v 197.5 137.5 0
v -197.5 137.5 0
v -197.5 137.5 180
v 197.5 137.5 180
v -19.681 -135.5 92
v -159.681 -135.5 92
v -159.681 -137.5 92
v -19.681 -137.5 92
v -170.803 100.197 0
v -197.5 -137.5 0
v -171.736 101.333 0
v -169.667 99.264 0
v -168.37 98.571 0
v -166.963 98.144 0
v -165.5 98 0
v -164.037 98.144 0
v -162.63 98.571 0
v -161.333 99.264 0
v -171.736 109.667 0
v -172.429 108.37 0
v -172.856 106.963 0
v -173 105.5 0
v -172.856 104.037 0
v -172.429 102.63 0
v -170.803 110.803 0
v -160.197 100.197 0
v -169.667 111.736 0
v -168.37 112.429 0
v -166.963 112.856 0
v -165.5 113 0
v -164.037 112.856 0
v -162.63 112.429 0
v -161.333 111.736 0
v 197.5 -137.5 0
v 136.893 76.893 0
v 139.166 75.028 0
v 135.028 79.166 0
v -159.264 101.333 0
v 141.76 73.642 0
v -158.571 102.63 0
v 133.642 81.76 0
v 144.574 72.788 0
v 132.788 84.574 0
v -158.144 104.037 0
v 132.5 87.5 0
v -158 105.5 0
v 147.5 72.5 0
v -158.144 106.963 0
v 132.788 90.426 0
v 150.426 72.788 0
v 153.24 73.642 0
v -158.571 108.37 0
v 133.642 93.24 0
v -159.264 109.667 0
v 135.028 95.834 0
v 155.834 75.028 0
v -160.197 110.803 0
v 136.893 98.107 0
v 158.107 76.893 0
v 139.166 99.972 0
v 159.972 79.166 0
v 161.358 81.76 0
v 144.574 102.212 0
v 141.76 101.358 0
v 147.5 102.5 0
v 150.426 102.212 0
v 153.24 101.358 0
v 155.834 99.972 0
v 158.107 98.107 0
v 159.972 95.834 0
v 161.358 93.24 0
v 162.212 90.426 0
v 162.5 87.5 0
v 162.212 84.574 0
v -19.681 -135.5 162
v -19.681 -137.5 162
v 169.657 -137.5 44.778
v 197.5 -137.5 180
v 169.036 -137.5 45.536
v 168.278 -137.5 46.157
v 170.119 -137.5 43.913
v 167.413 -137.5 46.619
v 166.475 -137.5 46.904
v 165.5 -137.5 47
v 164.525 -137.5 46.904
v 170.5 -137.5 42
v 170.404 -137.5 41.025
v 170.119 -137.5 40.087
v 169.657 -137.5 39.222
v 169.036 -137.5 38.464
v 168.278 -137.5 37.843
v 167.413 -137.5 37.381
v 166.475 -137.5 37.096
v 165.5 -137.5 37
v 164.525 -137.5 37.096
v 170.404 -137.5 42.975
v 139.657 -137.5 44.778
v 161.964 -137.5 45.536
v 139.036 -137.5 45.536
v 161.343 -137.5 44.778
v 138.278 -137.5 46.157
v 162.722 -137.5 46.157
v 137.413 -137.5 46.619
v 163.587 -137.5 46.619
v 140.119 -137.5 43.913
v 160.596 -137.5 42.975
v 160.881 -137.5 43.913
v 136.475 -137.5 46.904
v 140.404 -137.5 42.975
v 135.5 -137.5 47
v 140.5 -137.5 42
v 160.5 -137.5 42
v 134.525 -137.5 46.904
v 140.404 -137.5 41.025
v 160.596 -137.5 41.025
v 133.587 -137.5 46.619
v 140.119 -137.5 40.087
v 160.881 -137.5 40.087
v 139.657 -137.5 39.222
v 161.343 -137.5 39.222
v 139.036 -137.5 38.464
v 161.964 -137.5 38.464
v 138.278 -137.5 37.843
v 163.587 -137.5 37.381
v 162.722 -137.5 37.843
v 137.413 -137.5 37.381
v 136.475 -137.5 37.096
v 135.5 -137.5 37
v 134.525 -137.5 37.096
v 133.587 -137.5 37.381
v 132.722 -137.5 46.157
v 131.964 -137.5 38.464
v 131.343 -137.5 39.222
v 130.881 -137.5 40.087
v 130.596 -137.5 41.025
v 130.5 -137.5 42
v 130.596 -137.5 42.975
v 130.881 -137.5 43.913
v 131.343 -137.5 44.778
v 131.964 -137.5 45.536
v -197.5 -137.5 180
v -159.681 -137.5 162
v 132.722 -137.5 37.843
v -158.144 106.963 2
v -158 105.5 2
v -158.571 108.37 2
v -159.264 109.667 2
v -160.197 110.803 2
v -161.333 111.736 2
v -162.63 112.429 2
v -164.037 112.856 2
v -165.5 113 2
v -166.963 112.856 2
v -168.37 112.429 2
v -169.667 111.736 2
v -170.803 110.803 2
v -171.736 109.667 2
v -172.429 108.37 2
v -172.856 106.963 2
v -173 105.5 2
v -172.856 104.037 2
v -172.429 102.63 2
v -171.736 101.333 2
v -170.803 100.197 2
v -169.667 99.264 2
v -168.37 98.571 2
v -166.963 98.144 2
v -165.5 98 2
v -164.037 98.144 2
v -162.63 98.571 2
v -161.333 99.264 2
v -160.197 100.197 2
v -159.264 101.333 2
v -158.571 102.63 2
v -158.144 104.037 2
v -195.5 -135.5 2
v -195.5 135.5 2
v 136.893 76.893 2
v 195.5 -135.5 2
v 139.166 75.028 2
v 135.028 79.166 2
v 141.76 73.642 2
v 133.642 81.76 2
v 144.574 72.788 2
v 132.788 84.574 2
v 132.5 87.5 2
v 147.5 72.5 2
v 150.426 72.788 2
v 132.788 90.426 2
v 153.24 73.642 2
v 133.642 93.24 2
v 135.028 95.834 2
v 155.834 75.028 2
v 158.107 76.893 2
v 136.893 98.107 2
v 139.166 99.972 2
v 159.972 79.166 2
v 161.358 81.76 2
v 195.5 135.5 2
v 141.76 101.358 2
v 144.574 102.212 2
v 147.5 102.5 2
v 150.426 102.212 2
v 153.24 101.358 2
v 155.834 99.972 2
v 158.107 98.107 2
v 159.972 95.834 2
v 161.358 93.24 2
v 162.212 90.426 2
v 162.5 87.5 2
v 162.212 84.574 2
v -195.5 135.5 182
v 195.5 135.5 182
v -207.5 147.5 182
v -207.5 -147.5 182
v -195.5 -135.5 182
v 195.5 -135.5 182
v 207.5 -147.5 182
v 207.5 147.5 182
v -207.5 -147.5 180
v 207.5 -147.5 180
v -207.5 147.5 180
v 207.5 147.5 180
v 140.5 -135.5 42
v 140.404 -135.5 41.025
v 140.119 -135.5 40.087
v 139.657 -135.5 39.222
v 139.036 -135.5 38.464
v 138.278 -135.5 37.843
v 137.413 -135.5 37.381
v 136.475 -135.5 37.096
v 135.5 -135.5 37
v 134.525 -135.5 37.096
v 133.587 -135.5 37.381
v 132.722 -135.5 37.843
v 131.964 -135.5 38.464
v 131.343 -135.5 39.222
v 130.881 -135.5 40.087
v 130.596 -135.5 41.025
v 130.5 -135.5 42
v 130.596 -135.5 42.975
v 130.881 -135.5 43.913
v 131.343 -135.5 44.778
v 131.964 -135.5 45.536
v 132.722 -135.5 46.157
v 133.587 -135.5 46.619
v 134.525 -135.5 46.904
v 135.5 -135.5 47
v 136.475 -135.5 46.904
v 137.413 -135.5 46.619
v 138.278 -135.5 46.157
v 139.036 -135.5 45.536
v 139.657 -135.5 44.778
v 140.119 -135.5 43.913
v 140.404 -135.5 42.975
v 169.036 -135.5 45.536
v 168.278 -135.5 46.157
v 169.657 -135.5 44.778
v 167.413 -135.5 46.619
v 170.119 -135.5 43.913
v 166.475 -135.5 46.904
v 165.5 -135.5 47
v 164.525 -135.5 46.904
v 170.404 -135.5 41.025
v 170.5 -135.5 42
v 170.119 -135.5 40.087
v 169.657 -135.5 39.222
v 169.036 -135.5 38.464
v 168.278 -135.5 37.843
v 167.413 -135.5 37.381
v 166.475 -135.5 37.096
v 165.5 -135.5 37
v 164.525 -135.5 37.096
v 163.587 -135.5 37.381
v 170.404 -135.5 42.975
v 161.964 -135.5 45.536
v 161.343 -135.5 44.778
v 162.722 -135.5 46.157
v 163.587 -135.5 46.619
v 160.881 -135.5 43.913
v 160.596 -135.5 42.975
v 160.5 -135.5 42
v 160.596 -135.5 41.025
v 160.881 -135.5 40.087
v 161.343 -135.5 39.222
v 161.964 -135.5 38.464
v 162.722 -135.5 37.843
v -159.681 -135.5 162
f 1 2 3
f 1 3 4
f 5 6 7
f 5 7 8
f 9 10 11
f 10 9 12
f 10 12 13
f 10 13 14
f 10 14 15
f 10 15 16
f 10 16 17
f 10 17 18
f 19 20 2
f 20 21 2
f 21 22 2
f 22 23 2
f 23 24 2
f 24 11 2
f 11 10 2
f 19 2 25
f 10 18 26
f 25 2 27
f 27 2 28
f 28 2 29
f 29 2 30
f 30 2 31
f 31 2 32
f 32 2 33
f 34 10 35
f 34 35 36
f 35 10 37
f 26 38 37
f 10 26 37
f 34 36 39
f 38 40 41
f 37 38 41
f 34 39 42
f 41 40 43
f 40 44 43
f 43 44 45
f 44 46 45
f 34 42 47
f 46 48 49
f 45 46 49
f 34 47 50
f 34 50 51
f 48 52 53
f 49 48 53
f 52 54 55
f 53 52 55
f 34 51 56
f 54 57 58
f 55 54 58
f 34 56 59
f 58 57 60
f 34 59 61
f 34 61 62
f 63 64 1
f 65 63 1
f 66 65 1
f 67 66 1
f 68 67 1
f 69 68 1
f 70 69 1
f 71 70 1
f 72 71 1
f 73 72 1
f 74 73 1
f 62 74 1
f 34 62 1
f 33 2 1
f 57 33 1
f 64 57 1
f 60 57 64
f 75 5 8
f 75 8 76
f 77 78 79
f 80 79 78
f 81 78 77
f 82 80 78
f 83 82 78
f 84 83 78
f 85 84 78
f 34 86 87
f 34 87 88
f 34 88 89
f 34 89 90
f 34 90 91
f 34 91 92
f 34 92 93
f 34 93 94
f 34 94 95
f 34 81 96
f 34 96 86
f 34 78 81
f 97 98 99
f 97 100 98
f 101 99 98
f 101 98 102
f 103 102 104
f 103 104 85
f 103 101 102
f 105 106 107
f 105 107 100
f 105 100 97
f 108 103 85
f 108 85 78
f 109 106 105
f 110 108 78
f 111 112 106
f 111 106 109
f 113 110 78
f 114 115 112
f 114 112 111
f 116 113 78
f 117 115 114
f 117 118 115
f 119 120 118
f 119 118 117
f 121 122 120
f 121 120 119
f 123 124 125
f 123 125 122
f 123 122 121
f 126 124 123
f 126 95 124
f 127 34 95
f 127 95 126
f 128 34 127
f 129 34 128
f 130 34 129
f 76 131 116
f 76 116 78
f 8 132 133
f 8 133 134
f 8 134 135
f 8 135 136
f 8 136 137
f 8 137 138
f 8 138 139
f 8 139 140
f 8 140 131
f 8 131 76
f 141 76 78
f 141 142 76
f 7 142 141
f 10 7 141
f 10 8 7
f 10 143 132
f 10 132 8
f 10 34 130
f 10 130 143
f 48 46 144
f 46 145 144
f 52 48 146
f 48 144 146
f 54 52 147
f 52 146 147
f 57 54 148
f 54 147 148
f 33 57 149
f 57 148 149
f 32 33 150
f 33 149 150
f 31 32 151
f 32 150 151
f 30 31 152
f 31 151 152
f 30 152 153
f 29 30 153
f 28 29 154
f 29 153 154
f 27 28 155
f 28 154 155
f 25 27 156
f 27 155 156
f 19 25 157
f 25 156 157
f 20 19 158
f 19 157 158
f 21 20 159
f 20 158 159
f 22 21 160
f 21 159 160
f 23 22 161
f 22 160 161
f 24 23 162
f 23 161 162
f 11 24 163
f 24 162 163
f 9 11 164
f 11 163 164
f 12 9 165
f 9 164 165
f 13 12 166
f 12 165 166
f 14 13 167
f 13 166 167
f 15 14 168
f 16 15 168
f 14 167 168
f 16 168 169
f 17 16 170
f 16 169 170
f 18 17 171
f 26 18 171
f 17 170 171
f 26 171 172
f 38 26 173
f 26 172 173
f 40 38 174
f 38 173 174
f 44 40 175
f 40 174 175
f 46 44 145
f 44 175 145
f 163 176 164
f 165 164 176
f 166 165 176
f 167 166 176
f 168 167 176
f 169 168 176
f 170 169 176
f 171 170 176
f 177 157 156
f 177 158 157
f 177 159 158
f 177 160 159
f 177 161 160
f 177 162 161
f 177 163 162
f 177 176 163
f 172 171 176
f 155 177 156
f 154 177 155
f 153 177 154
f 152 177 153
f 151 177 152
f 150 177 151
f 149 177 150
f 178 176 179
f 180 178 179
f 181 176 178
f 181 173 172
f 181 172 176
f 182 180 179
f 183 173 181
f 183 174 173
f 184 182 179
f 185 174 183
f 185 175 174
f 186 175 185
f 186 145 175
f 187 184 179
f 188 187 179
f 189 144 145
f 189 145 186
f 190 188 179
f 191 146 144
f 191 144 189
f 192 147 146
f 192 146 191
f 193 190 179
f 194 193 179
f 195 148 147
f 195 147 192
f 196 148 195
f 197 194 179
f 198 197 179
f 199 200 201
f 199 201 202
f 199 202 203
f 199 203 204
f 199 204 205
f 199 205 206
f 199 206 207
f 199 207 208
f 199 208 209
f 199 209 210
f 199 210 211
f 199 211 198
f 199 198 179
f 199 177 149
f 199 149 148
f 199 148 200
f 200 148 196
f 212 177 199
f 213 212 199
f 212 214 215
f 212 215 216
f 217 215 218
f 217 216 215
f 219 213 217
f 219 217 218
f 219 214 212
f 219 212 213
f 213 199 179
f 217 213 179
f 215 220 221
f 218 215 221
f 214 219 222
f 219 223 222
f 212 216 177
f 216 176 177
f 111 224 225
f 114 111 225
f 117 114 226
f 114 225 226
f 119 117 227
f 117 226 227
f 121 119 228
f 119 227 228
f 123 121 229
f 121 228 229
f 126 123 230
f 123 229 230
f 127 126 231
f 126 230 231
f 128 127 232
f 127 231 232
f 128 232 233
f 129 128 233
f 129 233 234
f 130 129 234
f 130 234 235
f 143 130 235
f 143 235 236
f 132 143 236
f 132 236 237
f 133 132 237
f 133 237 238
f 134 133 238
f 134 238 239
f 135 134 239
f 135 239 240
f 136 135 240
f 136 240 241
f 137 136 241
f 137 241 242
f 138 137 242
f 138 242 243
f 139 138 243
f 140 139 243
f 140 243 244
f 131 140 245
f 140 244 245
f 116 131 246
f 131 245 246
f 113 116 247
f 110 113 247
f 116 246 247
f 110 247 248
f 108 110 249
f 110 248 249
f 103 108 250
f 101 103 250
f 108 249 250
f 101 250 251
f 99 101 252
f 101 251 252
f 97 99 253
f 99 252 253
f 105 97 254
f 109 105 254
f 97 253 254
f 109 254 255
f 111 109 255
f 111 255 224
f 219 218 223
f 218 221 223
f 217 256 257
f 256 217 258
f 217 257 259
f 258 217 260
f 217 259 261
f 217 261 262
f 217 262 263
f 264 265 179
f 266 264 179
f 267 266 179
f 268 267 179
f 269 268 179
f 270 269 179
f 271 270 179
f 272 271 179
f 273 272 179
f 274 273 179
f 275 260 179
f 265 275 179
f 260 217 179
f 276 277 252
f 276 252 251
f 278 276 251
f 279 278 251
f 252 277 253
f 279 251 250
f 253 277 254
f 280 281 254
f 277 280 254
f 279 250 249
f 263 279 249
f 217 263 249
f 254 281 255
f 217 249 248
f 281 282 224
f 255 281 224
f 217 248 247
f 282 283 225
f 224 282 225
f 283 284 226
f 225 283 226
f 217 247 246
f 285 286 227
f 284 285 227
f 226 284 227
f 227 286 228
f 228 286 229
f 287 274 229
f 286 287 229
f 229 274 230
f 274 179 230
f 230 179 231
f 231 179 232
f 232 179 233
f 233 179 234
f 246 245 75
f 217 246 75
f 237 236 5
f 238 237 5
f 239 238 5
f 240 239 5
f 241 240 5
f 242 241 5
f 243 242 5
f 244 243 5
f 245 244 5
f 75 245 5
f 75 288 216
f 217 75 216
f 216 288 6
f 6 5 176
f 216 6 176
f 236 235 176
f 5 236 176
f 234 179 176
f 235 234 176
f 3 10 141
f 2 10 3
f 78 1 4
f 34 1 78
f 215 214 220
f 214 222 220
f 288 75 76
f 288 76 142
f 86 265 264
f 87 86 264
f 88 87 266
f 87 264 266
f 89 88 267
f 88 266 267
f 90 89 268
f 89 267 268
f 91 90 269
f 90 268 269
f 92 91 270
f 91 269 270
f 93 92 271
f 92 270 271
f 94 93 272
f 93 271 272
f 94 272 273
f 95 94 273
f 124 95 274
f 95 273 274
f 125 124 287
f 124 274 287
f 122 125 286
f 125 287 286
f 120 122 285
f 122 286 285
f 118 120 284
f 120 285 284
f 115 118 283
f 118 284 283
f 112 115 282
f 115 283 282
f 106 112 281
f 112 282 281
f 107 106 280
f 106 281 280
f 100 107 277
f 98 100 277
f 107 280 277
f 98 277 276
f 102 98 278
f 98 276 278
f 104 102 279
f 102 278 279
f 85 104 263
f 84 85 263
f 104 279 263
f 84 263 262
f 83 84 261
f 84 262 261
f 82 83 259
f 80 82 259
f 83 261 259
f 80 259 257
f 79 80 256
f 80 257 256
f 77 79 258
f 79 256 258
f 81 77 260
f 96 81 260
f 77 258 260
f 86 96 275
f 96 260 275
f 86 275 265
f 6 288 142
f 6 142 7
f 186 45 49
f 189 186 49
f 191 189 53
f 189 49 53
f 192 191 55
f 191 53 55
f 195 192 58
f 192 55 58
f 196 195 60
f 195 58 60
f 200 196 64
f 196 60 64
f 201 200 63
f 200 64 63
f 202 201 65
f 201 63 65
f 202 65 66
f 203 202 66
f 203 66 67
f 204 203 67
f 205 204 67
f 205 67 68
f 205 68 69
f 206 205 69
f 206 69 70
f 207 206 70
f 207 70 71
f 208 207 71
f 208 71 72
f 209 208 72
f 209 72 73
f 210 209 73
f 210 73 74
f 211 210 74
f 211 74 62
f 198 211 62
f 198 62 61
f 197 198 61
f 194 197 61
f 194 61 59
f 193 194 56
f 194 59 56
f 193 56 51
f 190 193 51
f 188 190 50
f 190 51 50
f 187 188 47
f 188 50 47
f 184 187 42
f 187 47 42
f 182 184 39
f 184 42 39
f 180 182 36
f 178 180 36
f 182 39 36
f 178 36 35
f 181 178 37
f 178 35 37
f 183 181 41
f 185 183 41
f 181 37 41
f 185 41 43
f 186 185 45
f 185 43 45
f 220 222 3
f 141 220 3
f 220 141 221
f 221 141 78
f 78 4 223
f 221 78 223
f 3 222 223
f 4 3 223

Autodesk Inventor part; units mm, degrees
ref_plane "YZ Plane" through (0, 0, 0) normal (1, 0, 0) x (0, 1, 0)
ref_plane "XZ Plane" through (0, 0, 0) normal (0, 1, 0) x (-1, 0, 0)
sketch "Skizze1" plane through (0, 0, 0) normal (0, 0, 1) x (1, 0, 0)
  line L0 (-276.5, 0) -> (276.5, 0) projected
  line L1 (0, -192.5) -> (0, 192.5) projected
  line L2 (-197.5, 137.5) -> (197.5, 137.5)
  line L3 (197.5, 137.5) -> (197.5, -137.5)
  line L4 (197.5, -137.5) -> (-197.5, -137.5)
  line L5 (-197.5, -137.5) -> (-197.5, 137.5)
  point P0 (0, 0)
  dimension "d0" = 395
  dimension "d1" = 275
extrude "Extrusion1" add sketch "Skizze1" along normal blind 180
sketch "Skizze2" plane through (0, 0, 180) normal (0, 0, 1) x (1, 0, 0)
  line L0 (-195.5, 135.5) -> (195.5, 135.5)
  line L1 (195.5, 135.5) -> (195.5, -135.5)
  line L2 (195.5, -135.5) -> (-195.5, -135.5)
  line L3 (-195.5, -135.5) -> (-195.5, 135.5)
  line L4 (197.5, 137.5) -> (-197.5, 137.5) projected
  line L5 (197.5, -137.5) -> (197.5, 137.5) projected
  line L6 (-197.5, -137.5) -> (197.5, -137.5) projected
  line L7 (-197.5, 137.5) -> (-197.5, -137.5) projected
  point P0 (0, 0)
  dimension "d4" = 2
  dimension "d5" = 2
  dimension "d6" = 2
  dimension "d7" = 2
extrude "Extrusion2" cut sketch "Skizze2" against normal blind 178 contours L0 L1 L2 L3
ref_plane "Arbeitsebene1" through (0, 0, 180) normal (0, 0, 1) x (1, 0, 0)
sketch "Skizze4" plane through (0, 0, 180) normal (0, 0, 1) x (1, 0, 0)
  line L0 (-207.5, -147.5) -> (207.5, -147.5)
  line L1 (207.5, -147.5) -> (207.5, 147.5)
  line L2 (207.5, 147.5) -> (-207.5, 147.5)
  line L3 (-207.5, 147.5) -> (-207.5, -147.5)
  line L4 (-195.5, -135.5) -> (-195.5, 135.5) projected
  line L5 (-195.5, 135.5) -> (195.5, 135.5) projected
  line L6 (195.5, 135.5) -> (195.5, -135.5) projected
  line L7 (195.5, -135.5) -> (-195.5, -135.5) projected
  point P0 (0, 0)
  dimension "d17" = 12
  dimension "d18" = 12
  dimension "d19" = 12
  dimension "d20" = 12
extrude "Extrusion4" add sketch "Skizze4" along normal blind 2
sketch "Skizze5" plane through (0, 0, 0) normal (0, 0, -1) x (-1, 0, 0)
  line L0 (-197.5, -137.5) -> (-197.5, 137.5) projected
  line L1 (-197.5, 137.5) -> (197.5, 137.5) projected
  circle A0 centre (-147.5, 87.5) radius 15
  point P0 (0, 0)
  dimension "d23" = 50
  dimension "d24" = 50
  dimension "d25" = 30
extrude "Extrusion5" cut sketch "Skizze5" against normal blind 10
sketch "Skizze6" plane through (-195.5, -135.5, 2) normal (0, 1, 0) x (1, 0, 0)
  line L0 (35.8194, -90) -> (175.8194, -90)
  line L1 (175.8194, -90) -> (175.8194, -160)
  line L2 (175.8194, -160) -> (35.8194, -160)
  line L3 (35.8194, -160) -> (35.8194, -90)
  line L4 (391, -180) -> (0, -180) projected
  point P0 (195.5, 2)
  dimension "d28" = 70
  dimension "d29" = 140
  dimension "d30" = 20
extrude "Extrusion6" cut sketch "Skizze6" against normal blind 10
sketch "Skizze7" plane through (0, 0, 2) normal (0, 0, 1) x (1, 0, 0)
  line L0 (-195.5, -135.5) -> (-195.5, 135.5) projected
  line L1 (-195.5, 135.5) -> (195.5, 135.5) projected
  circle A0 centre (-165.5, 105.5) radius 7.5
  point P0 (0, 0)
  dimension "d33" = 30
  dimension "d34" = 30
  dimension "d35" = 15
extrude "Extrusion7" cut sketch "Skizze7" against normal blind 10
sketch "Skizze8" plane through (-195.5, -135.5, 2) normal (0, 1, 0) x (1, 0, 0)
  line L0 (391, 0) -> (0, 0) projected
  line L1 (391, 0) -> (391, -180) projected
  circle A0 centre (361, -40) radius 5
  circle A1 centre (331, -40) radius 5
  point P0 (195.5, 2)
  dimension "d38" = 40
  dimension "d39" = 40
  dimension "d40" = 30
  dimension "d41" = 30
  dimension "d42" = 10
  dimension "d43" = 10
extrude "Extrusion8" cut sketch "Skizze8" against normal blind 10
properties part number "Schaltkasten"
